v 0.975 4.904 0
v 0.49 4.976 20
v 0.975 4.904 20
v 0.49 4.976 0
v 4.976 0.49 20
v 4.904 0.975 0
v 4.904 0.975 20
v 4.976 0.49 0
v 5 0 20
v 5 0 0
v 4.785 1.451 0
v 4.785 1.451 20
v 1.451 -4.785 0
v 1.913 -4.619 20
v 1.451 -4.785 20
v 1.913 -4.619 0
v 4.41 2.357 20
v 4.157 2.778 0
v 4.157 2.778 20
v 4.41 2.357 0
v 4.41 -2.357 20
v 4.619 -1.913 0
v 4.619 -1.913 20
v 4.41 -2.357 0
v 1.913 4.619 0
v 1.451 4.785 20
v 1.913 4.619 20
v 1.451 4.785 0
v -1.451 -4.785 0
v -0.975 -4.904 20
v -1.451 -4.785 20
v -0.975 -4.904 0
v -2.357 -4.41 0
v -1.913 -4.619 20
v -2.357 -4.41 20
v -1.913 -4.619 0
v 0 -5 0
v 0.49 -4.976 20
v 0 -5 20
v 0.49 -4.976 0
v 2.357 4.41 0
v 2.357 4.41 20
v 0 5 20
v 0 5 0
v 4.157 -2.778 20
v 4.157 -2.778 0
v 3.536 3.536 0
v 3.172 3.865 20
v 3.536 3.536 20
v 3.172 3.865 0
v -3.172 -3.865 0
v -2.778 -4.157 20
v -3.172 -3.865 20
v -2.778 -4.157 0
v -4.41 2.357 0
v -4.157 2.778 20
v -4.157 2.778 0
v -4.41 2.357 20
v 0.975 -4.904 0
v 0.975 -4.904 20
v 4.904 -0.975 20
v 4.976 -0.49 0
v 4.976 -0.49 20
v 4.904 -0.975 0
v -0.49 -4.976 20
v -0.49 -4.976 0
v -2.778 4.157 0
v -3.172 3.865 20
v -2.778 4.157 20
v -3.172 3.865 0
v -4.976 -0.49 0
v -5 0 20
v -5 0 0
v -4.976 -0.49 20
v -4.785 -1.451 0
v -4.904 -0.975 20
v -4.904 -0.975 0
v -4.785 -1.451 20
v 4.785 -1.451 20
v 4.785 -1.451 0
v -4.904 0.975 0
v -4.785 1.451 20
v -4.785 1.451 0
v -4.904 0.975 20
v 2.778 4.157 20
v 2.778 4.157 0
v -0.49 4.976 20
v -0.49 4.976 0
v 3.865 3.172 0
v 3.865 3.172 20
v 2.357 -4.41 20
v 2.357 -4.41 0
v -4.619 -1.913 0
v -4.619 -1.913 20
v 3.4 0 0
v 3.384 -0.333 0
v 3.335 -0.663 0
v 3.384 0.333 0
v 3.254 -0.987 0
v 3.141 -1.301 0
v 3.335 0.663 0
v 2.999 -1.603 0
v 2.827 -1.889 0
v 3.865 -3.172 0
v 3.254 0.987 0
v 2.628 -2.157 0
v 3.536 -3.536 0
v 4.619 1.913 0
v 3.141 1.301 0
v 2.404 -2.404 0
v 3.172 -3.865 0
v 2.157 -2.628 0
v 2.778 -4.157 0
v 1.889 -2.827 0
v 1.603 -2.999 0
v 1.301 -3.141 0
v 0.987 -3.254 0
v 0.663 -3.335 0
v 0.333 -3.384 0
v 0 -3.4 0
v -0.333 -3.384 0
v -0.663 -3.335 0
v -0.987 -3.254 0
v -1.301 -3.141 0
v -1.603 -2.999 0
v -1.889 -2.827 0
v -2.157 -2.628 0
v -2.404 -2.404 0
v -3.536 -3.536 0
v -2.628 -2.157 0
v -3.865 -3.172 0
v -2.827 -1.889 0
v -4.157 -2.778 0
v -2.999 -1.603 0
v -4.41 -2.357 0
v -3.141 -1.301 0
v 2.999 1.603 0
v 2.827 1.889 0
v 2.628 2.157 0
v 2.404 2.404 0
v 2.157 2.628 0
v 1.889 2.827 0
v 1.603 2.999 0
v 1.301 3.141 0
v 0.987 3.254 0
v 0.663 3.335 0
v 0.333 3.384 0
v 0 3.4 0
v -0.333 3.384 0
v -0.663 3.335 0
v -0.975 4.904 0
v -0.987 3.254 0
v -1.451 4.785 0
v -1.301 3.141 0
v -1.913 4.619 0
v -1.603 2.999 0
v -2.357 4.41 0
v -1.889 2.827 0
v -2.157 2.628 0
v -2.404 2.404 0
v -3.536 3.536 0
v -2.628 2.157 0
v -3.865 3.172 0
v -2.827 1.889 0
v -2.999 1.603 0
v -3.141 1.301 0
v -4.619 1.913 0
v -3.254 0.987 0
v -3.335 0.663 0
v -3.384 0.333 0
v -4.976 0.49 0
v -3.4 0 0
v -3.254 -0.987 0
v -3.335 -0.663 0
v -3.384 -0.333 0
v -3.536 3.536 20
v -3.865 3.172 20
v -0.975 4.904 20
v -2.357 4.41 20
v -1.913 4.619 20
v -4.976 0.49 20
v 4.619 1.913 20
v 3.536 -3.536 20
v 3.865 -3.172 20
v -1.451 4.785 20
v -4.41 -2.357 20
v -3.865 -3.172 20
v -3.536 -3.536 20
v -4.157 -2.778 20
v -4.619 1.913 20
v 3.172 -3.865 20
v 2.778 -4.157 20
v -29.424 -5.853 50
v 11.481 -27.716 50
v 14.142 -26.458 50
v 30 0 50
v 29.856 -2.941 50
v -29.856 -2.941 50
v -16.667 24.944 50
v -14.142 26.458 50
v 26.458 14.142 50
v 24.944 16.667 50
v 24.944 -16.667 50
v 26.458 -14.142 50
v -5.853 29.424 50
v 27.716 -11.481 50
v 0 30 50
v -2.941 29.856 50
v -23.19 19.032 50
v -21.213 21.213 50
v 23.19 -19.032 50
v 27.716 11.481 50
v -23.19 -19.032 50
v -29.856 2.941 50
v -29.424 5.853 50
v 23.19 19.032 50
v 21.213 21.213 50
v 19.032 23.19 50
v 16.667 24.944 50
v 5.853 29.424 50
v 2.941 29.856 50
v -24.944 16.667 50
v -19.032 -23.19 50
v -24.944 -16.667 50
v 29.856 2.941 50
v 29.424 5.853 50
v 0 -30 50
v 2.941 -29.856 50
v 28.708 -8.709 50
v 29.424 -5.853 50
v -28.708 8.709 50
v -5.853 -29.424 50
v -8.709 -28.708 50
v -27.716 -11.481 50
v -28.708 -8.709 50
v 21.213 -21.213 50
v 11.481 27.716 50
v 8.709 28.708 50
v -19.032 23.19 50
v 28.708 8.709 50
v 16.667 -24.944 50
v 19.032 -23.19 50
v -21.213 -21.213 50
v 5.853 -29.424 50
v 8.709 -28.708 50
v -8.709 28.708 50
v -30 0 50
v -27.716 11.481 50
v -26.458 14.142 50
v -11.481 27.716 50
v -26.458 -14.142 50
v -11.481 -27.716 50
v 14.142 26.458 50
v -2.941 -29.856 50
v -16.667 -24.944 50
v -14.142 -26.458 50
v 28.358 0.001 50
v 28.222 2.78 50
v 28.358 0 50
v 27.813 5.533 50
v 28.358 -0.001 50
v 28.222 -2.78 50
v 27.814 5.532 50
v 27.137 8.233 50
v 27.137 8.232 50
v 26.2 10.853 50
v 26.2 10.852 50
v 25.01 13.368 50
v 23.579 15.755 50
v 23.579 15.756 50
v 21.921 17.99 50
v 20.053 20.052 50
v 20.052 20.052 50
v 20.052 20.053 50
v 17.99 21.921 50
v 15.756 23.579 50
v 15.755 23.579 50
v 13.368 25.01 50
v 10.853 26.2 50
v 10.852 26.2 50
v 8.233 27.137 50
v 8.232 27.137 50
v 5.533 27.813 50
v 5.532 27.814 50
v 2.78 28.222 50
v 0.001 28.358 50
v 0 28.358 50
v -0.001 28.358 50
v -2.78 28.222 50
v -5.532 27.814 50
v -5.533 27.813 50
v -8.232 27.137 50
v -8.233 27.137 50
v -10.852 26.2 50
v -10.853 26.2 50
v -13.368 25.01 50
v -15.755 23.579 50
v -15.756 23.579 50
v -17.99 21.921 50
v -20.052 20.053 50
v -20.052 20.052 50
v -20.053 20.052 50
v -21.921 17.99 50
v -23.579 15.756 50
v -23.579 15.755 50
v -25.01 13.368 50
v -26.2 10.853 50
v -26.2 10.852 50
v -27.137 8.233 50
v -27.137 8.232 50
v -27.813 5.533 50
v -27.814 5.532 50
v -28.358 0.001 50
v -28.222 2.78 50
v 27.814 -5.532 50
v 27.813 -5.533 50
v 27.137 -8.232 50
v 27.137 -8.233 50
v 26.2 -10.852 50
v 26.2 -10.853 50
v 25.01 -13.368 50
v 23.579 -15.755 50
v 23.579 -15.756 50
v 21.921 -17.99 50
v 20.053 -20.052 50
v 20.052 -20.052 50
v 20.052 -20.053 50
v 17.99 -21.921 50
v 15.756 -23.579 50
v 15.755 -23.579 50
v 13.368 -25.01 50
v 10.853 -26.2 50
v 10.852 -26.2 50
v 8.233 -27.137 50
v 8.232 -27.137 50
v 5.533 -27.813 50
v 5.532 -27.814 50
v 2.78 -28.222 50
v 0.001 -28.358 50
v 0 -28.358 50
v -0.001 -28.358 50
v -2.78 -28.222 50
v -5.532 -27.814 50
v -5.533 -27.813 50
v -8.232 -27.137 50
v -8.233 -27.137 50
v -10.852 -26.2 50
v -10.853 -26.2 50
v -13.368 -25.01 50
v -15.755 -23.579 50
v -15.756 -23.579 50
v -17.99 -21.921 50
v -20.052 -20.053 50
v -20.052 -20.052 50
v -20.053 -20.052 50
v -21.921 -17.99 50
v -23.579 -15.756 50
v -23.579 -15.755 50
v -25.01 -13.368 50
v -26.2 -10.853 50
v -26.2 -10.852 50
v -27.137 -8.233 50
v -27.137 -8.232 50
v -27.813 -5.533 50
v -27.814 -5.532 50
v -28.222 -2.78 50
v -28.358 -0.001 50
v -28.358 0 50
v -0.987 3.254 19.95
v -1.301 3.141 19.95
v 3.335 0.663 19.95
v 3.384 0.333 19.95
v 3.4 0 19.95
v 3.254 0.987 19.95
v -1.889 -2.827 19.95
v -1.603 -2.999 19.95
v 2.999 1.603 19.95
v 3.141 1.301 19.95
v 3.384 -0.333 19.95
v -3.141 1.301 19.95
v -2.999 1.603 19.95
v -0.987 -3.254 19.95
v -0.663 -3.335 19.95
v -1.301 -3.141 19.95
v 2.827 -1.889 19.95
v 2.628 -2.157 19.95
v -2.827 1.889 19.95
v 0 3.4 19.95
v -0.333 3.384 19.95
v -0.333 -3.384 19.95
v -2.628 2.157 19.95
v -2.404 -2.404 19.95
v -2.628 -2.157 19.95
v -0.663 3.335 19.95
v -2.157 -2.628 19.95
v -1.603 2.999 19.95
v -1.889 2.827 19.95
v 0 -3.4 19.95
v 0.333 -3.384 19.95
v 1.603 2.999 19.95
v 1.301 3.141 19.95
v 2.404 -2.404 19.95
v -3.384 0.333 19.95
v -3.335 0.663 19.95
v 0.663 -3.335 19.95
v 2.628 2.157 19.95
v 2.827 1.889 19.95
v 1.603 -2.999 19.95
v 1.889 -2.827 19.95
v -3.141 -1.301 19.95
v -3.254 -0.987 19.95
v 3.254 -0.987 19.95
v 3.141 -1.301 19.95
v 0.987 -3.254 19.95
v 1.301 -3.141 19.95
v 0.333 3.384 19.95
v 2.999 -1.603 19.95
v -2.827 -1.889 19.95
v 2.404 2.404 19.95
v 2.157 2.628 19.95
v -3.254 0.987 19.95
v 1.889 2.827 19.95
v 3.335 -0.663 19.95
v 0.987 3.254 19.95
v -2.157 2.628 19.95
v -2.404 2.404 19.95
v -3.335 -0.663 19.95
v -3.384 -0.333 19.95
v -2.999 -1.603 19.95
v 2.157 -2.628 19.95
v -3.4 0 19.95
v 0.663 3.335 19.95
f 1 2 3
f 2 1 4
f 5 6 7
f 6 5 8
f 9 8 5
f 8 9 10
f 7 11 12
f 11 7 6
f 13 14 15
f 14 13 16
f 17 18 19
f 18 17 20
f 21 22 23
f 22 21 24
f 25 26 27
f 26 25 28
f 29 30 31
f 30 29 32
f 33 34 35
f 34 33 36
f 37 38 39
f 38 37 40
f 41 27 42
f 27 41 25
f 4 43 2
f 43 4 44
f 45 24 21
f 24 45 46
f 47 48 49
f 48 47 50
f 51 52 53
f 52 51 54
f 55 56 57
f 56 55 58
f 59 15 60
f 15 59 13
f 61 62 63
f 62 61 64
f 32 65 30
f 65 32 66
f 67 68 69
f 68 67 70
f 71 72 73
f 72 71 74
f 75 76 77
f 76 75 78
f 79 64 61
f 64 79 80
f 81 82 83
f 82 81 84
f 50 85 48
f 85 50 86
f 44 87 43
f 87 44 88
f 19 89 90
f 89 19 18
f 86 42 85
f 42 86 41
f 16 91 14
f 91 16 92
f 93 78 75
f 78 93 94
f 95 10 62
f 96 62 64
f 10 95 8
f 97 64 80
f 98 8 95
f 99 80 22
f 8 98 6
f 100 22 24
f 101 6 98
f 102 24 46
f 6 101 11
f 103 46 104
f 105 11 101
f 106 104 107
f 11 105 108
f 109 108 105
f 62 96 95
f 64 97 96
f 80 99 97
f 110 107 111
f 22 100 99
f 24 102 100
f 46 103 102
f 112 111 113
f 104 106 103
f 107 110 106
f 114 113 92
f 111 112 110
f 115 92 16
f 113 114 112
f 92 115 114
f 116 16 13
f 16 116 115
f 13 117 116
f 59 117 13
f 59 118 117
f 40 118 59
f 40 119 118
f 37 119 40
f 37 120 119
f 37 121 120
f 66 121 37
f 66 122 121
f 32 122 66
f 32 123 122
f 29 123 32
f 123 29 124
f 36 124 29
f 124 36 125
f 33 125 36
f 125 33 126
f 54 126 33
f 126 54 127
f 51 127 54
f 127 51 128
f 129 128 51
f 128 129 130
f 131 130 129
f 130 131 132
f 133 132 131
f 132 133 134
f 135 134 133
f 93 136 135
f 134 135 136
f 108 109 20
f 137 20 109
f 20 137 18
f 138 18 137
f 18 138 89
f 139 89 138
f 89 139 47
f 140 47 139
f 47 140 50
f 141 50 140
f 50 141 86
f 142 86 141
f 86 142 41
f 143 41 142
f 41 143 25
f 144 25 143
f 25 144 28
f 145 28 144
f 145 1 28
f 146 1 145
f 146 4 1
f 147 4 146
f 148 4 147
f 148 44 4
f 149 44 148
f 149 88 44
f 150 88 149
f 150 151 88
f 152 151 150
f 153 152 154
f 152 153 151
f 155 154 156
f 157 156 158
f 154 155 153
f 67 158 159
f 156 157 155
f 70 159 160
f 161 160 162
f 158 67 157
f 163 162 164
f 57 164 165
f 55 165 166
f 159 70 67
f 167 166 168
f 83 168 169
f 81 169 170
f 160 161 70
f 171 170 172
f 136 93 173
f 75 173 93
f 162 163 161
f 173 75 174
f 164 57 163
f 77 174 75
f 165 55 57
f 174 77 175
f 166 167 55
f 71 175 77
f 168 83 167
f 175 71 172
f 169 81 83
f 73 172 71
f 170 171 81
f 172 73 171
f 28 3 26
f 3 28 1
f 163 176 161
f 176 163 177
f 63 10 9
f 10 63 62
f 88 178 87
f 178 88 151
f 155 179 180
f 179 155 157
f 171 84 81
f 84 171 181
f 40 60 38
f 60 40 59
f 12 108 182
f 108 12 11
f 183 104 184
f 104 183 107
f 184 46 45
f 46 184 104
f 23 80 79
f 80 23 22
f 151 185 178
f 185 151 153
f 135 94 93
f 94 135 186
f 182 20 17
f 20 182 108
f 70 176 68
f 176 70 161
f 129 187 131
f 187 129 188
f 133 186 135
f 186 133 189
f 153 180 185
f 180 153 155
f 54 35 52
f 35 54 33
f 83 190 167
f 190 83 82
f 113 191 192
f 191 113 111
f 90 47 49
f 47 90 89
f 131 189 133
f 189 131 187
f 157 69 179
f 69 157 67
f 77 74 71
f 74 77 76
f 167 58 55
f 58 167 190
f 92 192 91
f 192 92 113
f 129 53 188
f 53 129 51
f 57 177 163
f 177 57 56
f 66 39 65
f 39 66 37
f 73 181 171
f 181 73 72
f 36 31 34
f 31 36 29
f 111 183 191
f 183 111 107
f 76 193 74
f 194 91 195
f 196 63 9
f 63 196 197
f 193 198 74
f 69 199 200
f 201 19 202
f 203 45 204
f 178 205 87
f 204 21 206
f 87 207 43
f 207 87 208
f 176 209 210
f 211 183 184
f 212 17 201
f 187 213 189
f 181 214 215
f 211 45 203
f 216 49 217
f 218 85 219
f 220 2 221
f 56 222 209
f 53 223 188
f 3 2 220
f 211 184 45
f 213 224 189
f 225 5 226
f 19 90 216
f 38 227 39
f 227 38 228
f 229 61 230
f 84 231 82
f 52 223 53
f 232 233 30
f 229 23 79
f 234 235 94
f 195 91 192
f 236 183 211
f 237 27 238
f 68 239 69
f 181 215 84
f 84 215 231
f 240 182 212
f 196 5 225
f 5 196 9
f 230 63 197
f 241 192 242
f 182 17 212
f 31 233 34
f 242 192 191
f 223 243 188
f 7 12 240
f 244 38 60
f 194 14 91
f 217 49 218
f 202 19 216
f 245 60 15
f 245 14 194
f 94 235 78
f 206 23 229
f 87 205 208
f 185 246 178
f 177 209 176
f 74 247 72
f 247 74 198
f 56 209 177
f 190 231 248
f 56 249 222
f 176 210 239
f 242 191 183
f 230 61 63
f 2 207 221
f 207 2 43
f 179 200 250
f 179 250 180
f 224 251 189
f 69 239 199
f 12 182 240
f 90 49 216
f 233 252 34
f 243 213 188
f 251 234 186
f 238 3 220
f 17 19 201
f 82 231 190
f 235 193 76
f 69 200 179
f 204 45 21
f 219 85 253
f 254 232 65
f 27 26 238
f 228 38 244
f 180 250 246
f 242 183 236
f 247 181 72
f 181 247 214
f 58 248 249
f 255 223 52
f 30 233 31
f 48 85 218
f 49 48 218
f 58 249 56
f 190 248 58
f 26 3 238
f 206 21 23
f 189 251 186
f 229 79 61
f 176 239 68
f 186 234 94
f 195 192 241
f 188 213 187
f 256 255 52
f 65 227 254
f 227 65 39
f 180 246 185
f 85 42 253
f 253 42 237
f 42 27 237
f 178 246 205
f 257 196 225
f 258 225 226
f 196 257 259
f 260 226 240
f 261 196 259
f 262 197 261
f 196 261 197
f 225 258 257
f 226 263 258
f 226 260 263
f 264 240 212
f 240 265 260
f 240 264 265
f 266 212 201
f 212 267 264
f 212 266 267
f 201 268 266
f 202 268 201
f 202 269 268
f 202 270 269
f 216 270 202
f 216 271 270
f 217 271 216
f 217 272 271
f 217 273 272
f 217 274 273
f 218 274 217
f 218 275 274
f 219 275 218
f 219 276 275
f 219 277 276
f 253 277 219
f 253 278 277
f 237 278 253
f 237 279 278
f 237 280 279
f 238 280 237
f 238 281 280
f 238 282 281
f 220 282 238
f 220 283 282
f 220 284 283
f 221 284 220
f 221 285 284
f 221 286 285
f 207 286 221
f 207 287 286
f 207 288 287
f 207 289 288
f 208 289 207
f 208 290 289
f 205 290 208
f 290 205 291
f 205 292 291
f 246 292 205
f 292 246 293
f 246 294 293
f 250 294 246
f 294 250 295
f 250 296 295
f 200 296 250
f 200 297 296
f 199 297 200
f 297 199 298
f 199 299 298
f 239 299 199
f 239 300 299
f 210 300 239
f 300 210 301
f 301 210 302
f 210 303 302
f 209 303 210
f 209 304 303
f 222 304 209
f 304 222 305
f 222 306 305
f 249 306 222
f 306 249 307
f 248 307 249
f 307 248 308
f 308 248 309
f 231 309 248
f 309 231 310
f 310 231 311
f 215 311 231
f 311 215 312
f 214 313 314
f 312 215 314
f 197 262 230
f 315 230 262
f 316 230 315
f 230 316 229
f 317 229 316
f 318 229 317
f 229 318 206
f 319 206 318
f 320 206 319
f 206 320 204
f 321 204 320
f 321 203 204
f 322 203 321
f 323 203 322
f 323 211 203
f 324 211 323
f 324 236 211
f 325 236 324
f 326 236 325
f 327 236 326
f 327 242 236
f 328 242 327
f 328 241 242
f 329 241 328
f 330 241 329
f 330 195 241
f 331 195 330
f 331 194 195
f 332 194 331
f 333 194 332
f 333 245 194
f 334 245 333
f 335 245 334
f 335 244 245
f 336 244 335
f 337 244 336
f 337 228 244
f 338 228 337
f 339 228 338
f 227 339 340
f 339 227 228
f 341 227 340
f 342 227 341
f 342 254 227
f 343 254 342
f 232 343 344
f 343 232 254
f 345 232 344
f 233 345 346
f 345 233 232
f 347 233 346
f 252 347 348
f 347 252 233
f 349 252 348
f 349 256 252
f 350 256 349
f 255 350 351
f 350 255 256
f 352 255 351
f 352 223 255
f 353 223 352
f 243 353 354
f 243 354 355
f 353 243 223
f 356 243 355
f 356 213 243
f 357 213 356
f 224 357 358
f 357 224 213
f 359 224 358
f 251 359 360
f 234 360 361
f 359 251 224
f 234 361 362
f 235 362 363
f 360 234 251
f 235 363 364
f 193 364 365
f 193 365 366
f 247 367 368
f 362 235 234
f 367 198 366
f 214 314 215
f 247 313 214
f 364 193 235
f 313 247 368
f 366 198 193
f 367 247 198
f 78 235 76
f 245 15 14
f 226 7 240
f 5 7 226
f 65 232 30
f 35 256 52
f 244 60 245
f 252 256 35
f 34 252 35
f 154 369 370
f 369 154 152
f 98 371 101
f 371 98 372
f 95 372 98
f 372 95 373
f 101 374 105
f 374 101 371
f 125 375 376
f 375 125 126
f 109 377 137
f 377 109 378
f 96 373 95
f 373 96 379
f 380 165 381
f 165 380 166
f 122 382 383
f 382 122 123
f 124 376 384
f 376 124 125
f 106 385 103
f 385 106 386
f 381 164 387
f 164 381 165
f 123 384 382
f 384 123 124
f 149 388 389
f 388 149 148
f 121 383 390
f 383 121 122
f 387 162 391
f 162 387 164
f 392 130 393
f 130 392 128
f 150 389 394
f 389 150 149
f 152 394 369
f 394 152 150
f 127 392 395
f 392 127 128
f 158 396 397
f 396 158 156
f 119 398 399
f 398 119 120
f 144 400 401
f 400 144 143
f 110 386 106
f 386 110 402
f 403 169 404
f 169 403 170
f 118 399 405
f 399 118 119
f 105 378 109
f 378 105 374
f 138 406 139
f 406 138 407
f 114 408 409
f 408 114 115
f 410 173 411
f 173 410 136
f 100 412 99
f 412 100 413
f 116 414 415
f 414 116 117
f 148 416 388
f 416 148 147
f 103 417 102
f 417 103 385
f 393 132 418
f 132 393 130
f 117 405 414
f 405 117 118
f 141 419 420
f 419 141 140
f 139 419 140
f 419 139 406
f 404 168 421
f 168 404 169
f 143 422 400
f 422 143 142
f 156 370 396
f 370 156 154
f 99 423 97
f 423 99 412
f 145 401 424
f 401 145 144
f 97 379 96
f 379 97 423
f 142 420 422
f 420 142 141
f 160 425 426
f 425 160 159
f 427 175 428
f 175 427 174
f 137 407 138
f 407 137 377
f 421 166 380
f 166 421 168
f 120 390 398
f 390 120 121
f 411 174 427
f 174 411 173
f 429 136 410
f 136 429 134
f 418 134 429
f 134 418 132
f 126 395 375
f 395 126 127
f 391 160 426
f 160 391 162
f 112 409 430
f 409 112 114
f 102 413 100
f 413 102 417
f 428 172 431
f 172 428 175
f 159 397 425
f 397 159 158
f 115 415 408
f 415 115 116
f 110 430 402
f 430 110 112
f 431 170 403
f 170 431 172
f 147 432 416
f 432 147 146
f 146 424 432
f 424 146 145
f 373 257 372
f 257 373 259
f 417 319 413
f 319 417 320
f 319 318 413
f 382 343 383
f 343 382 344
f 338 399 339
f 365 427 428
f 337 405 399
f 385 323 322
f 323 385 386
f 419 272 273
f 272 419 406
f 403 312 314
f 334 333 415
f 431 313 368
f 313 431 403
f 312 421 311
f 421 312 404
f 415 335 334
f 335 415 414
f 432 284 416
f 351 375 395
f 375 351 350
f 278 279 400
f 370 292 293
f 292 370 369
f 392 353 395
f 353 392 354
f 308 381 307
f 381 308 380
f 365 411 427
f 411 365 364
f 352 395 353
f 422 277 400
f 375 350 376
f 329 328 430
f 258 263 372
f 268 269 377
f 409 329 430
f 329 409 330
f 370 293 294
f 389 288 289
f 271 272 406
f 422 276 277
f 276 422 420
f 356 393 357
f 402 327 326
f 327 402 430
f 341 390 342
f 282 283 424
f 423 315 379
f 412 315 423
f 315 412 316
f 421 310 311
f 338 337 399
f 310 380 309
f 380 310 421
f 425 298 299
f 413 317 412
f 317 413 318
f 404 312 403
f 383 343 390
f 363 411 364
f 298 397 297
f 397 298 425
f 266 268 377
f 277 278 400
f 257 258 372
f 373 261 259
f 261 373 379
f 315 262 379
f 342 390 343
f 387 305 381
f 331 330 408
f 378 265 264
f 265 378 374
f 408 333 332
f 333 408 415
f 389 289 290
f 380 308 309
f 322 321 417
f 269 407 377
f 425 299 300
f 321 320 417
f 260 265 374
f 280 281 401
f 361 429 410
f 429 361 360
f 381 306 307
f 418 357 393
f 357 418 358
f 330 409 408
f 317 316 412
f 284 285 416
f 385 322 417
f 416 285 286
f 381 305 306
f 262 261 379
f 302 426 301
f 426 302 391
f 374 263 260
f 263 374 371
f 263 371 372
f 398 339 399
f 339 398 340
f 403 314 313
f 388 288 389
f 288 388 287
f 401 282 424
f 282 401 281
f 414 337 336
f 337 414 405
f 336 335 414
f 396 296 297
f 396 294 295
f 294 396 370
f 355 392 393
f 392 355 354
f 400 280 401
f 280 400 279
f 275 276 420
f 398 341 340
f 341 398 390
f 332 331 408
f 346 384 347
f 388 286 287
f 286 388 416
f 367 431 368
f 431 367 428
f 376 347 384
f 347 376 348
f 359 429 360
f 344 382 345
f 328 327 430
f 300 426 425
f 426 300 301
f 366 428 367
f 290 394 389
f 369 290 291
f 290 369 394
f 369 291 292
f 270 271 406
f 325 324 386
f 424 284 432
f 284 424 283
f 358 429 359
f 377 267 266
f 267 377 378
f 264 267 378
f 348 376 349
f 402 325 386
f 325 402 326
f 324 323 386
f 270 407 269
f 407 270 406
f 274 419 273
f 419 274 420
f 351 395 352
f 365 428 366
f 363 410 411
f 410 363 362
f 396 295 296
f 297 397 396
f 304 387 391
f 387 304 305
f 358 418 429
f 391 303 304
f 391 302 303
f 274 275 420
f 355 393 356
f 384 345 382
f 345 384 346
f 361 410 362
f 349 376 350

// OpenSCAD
// Dimensions
    spout_od = 10;
    spout_id = 6.8;
    spout_height = 20;
    funnel_top_od = 60;
    funnel_bottom_od = 10;
    funnel_top_z = 50;
    funnel_bottom_z = 20;
    wall_thickness = 1.6;
    fn = 64;

    // Derived dimensions
    spout_outer_r = spout_od / 2;
    spout_inner_r = spout_id / 2;
    cone_bottom_outer_r = funnel_bottom_od / 2;
    cone_top_outer_r = funnel_top_od / 2;
    cone_bottom_inner_r = spout_inner_r;
    cone_top_inner_r = (funnel_top_od - 2 * wall_thickness) / 2;

    // Z offsets for void extension (Rule 5)
    void_extension = 0.05;

    difference() {
        // Outer Solid
        union() {
            // Spout
            translate([0, 0, 0])
                cylinder(h = spout_height, r = spout_outer_r, $fn = fn);
            
            // Cone
            translate([0, 0, spout_height])
                cylinder(h = funnel_top_z - funnel_bottom_z, 
                         r1 = cone_bottom_outer_r, 
                         r2 = cone_top_outer_r, 
                         $fn = fn);
        }

        // Inner Void (Cutting Shape)
        // Extend past z=0 and z=50 to ensure no coplanar faces
        union() {
            // Inner Spout Void
            translate([0, 0, -void_extension])
                cylinder(h = spout_height + 2 * void_extension, 
                         r = spout_inner_r, 
                         $fn = fn);
            
            // Inner Cone Void
            translate([0, 0, spout_height - void_extension])
                cylinder(h = (funnel_top_z - funnel_bottom_z) + 2 * void_extension, 
                         r1 = cone_bottom_inner_r, 
                         r2 = cone_top_inner_r, 
                         $fn = fn);
        }
    }
